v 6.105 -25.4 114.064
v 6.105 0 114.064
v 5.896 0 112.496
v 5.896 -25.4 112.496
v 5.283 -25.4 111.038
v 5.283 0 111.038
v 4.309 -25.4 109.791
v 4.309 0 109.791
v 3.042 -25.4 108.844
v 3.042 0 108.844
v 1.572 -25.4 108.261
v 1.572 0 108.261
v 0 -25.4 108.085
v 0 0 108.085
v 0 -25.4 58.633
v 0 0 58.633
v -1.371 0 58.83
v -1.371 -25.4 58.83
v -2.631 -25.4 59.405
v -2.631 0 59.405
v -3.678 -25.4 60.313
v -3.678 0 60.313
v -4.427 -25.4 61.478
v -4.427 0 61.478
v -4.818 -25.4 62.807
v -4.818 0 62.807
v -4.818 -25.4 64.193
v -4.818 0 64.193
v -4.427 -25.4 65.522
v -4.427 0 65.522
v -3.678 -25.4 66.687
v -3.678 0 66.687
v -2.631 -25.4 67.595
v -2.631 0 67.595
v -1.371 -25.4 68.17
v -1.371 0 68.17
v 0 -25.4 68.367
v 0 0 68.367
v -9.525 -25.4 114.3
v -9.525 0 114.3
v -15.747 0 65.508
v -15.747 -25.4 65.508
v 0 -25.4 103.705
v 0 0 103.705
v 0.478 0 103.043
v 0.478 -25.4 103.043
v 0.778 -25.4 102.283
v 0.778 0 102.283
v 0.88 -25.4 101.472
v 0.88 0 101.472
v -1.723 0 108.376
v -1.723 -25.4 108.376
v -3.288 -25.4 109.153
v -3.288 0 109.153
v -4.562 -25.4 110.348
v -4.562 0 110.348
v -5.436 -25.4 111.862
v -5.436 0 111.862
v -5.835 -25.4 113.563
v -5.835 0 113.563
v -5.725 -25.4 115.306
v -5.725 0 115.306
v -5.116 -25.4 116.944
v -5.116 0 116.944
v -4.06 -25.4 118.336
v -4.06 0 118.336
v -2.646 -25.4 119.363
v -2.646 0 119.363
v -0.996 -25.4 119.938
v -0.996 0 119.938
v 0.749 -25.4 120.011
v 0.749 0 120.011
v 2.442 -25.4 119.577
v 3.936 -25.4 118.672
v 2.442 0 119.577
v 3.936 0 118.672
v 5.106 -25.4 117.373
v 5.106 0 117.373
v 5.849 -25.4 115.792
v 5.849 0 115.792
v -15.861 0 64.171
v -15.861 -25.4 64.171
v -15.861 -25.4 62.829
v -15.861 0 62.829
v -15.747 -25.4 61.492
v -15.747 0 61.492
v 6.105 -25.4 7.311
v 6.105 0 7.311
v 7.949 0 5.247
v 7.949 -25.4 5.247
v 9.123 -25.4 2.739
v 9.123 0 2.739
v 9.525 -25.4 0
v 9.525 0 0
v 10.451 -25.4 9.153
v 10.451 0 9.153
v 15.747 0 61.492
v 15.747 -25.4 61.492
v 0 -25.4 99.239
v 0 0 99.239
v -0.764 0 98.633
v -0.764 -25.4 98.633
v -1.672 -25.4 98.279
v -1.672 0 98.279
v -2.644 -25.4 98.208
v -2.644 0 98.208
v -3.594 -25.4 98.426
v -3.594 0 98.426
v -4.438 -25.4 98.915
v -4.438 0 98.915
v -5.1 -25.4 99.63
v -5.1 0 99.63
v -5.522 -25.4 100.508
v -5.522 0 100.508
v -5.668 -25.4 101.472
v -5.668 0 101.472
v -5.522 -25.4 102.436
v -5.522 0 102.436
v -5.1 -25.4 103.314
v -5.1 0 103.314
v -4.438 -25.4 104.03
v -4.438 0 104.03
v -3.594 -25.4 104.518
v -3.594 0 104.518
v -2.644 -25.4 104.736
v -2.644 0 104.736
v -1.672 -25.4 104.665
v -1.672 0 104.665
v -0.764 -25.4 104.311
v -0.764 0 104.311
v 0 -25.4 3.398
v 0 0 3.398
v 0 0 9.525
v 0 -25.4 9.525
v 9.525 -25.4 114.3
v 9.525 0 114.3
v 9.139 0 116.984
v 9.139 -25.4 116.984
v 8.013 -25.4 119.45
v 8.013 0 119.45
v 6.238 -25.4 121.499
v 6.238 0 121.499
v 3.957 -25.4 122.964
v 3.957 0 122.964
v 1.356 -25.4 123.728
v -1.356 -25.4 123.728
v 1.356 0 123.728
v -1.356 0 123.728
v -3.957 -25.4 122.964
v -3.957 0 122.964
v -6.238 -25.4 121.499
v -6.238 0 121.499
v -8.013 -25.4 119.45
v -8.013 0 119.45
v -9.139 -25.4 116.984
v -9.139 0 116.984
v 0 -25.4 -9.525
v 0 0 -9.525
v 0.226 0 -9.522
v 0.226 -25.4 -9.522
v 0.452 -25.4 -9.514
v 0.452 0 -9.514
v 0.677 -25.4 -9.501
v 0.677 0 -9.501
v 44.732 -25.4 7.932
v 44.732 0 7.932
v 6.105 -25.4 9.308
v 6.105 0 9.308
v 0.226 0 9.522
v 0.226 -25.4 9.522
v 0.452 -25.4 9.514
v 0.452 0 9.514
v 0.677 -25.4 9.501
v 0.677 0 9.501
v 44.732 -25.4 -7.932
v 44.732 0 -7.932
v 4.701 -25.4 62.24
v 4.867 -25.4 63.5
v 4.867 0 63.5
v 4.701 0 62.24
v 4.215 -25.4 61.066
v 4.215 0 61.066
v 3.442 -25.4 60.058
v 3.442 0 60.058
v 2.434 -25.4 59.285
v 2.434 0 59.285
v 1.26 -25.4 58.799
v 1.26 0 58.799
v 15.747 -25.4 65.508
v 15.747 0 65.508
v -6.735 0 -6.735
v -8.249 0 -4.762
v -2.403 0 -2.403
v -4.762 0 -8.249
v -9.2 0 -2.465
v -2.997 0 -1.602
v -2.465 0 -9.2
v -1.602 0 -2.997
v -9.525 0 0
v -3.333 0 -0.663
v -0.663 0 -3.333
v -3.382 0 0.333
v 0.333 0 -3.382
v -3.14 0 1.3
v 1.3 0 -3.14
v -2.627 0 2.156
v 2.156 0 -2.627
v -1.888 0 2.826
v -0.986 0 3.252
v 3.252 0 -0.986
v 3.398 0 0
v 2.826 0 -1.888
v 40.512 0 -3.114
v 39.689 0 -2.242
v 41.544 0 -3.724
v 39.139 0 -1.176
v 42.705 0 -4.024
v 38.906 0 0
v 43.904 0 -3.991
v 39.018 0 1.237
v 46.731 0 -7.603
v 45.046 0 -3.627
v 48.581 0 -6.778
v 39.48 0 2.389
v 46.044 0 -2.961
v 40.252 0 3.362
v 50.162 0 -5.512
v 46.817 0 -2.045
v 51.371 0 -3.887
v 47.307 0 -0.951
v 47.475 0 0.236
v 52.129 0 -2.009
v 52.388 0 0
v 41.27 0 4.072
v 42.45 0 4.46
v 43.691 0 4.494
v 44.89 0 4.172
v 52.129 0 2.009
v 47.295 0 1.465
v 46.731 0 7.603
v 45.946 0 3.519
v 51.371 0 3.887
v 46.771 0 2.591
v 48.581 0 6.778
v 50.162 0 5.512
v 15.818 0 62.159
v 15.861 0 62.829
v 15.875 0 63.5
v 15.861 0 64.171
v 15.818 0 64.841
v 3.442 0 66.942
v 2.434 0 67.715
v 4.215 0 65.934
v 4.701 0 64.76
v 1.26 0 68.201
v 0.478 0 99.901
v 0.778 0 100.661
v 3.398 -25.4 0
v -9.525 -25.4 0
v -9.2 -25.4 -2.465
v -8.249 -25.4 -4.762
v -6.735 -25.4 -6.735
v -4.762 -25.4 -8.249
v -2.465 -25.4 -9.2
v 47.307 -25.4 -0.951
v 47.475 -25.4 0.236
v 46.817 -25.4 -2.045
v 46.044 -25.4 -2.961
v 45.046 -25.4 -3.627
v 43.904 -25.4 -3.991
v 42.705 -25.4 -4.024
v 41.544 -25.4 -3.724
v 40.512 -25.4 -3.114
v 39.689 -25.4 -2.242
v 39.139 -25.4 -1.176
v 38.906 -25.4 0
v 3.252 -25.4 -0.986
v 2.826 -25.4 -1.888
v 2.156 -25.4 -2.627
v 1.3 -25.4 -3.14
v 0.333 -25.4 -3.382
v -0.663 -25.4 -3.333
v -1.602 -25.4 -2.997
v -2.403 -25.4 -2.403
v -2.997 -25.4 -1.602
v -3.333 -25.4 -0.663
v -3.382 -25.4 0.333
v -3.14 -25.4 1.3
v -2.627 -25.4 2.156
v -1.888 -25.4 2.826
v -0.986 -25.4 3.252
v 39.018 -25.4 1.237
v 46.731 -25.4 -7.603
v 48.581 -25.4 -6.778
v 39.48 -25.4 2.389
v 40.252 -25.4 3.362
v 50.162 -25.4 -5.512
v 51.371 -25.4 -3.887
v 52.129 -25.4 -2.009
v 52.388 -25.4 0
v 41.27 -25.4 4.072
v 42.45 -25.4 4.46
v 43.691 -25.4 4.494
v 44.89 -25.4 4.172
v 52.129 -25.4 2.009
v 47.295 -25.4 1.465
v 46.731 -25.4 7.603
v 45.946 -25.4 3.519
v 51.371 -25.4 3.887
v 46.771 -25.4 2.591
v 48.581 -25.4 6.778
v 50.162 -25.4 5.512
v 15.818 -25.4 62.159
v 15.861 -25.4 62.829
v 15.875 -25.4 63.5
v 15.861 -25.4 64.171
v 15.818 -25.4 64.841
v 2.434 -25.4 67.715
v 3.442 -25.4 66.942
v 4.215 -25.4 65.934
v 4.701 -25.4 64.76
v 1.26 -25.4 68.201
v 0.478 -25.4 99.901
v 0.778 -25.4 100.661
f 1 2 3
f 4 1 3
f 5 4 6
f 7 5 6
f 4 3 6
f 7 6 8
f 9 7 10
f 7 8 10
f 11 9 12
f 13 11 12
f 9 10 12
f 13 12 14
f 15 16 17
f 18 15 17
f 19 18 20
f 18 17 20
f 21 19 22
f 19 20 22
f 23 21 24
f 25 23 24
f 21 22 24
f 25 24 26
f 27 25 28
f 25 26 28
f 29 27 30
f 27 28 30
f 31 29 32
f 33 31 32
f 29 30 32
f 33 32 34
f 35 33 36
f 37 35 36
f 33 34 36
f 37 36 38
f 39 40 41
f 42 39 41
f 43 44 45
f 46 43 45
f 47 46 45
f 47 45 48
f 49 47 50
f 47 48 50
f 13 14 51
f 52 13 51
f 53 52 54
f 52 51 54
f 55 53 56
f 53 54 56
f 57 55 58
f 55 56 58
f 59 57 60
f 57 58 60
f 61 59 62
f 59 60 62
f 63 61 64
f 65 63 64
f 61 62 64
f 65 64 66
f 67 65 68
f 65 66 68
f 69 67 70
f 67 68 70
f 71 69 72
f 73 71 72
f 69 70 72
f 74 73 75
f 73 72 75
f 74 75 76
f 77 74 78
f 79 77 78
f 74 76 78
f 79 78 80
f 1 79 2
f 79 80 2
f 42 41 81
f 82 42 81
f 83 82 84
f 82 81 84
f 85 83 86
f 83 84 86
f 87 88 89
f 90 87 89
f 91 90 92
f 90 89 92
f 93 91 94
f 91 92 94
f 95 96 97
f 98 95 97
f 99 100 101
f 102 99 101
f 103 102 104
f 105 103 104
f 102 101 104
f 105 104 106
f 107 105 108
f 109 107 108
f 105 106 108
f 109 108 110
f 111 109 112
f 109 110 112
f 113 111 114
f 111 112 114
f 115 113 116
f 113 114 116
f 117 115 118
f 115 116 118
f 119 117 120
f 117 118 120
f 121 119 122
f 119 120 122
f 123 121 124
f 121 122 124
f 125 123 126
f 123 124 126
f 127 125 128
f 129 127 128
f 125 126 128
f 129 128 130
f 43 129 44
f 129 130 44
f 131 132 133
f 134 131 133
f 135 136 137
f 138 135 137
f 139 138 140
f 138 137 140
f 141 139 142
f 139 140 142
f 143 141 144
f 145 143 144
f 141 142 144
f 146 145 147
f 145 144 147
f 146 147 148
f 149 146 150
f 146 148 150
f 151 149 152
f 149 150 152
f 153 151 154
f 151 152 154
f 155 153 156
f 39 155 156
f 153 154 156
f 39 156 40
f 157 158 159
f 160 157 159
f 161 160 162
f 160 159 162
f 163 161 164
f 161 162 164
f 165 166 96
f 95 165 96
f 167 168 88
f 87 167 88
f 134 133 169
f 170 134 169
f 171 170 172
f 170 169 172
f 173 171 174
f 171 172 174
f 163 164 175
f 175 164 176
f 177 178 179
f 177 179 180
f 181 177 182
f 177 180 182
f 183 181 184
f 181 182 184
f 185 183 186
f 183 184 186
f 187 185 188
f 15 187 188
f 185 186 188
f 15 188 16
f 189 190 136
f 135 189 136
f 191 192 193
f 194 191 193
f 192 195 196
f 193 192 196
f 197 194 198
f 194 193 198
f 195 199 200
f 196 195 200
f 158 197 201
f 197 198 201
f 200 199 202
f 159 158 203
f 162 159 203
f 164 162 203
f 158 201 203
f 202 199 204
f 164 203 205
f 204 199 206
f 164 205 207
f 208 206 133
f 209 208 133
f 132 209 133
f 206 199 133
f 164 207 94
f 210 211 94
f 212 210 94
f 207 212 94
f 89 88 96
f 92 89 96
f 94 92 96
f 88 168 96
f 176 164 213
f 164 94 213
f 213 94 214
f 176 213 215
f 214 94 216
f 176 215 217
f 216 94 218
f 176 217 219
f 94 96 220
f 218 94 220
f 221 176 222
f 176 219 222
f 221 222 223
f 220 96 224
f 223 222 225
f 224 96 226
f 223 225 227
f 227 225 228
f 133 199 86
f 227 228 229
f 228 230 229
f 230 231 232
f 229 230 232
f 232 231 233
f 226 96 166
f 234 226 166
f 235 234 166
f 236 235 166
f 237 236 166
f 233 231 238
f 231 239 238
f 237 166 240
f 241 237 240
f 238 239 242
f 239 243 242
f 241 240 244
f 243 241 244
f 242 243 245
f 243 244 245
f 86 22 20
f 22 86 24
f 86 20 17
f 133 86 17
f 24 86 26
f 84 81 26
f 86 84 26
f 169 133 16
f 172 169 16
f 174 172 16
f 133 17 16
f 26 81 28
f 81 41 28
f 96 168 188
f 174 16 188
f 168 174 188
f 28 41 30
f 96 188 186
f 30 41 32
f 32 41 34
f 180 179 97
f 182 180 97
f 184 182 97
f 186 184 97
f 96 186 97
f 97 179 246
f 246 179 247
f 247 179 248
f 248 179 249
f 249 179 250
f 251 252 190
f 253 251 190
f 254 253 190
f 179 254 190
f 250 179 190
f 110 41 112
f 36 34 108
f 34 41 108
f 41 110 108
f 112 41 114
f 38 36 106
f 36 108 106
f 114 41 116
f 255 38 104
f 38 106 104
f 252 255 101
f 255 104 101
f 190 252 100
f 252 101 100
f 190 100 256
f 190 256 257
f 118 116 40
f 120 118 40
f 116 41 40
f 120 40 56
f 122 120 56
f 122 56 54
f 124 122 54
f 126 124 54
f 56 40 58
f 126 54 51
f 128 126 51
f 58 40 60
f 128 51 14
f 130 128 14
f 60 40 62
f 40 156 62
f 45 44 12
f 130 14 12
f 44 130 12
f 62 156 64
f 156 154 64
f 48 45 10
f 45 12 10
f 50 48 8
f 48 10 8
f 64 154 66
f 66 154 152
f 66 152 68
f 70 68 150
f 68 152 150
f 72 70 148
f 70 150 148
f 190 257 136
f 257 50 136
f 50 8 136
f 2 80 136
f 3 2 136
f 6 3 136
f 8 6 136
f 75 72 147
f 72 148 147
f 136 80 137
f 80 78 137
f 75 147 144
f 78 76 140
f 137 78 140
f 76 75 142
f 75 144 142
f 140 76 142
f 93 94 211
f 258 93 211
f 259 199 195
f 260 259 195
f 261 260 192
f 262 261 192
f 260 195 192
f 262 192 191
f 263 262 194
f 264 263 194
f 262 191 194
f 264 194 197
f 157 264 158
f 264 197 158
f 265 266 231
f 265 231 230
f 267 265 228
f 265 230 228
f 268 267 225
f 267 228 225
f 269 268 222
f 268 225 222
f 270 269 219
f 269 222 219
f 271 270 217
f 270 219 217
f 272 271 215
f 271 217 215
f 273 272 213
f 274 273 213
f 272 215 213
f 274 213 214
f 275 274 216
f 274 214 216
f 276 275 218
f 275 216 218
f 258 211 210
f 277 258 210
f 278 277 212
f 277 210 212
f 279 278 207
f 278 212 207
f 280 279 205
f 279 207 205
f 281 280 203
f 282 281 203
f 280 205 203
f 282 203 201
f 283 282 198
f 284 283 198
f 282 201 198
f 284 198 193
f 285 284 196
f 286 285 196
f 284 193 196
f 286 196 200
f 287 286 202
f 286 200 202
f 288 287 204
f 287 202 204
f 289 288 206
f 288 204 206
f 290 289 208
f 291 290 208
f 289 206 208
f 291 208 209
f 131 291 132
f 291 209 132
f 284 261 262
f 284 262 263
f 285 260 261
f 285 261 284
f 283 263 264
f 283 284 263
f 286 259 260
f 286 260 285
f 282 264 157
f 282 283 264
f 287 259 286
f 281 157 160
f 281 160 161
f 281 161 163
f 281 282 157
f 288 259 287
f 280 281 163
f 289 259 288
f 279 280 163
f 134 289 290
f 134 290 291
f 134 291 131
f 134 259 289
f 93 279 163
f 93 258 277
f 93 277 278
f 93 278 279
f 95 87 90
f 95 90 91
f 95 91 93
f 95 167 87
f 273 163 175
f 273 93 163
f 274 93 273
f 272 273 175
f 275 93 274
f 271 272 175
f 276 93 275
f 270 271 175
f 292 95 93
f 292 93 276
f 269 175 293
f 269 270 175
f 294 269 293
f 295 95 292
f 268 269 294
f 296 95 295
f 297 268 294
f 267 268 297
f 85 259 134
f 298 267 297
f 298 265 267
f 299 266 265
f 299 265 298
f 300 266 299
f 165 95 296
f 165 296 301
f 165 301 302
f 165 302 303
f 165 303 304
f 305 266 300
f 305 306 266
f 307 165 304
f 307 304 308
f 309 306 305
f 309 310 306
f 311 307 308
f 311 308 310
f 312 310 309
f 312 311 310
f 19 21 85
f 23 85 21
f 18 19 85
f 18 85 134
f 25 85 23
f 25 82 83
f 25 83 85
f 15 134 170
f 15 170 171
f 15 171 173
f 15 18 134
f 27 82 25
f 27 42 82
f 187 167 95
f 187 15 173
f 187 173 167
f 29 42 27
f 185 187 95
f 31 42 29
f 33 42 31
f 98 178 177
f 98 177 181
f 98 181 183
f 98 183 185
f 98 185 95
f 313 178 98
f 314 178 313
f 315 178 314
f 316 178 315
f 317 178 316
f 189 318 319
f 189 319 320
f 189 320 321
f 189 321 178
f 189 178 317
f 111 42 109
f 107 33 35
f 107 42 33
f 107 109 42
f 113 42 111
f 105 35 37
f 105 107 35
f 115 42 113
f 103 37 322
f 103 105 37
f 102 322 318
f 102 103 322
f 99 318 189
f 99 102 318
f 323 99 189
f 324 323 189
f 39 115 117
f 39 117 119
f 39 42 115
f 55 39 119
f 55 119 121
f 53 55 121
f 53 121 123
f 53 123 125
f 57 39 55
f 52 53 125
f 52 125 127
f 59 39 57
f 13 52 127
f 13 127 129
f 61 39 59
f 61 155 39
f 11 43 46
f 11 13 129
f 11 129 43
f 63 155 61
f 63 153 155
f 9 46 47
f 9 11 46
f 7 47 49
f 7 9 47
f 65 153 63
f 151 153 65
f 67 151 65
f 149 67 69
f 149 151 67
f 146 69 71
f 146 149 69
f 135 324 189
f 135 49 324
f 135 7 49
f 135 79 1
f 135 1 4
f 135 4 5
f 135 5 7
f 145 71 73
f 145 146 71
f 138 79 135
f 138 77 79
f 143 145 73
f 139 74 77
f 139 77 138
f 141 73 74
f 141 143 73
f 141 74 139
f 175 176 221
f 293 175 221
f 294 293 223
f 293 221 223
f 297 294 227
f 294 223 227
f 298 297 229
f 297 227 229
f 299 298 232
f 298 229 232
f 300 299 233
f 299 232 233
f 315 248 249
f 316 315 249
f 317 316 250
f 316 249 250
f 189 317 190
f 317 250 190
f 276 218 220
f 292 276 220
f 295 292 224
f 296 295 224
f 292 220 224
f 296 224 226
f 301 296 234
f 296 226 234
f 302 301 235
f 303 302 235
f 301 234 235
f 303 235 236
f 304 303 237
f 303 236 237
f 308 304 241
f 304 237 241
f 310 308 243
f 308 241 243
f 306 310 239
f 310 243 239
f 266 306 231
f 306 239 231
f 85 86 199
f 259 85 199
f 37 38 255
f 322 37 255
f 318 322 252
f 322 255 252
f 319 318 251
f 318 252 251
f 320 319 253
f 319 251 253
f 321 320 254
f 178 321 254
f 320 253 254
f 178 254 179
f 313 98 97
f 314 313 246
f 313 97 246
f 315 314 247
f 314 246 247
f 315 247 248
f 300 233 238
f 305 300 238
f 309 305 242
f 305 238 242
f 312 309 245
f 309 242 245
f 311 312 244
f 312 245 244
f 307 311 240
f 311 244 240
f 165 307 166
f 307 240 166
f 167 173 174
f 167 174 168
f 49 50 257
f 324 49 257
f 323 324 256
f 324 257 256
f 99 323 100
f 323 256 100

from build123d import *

# Parameters (mm, degrees)
F1_DEPTH = 25.4


with BuildPart() as f1:
    # F0 (on Front) → F1 (new body)
    with BuildSketch(Plane.XZ):
        with BuildLine():
            ThreePointArc((-9.525, 114.3), (-6.7351920908, 107.5648079092), (0, 104.775))
            ThreePointArc((0, 104.775), (6.7351920908, 107.5648079092), (9.525, 114.3))
            ThreePointArc((9.525, 114.3), (0, 123.825), (-9.525, 114.3))
        make_face()
        with BuildLine():
            ThreePointArc((6.104734078, 114.063590765), (4.3089160173, 109.7911312939), (0, 108.084639221))
            ThreePointArc((0, 108.084639221), (-4.0599425849, 118.3360502361), (6.104734078, 114.063590765))
        make_face(mode=Mode.SUBTRACT)
        with BuildLine():
            ThreePointArc((9.525, 114.3), (6.7351920908, 107.5648079092), (0, 104.775))
            Line((0, 104.775), (0, 103.7053296111))
            ThreePointArc((0, 103.7053296111), (0.6520493641, 102.6722677878), (0.8799784566, 101.4720872045))
            ThreePointArc((0.8799784566, 101.4720872045), (0.6520493641, 100.2719066211), (0, 99.2388447978))
            Line((0, 99.2388447978), (0, 79.375))
            ThreePointArc((0, 79.375), (10.4912828548, 75.4142187767), (15.7474569047, 65.5082893304))
            Line((15.7474569047, 65.5082893304), (9.525, 114.3))
        make_face()
        with BuildLine():
            Line((0, 103.7053296111), (0, 104.775))
            ThreePointArc((0, 104.775), (-6.7351920908, 107.5648079092), (-9.525, 114.3))
            Line((-9.525, 114.3), (-15.7474569047, 65.5082893304))
            ThreePointArc((-15.7474569047, 65.5082893304), (-10.4912828548, 75.4142187767), (0, 79.375))
            Line((0, 79.375), (0, 99.2388447978))
            ThreePointArc((0, 99.2388447978), (-5.6676065299, 101.4720872045), (0, 103.7053296111))
        make_face()
        with BuildLine():
            ThreePointArc((0, 79.375), (-10.4912828548, 75.4142187767), (-15.7474569047, 65.5082893304))
            ThreePointArc((-15.7474569047, 65.5082893304), (-15.875, 63.5), (-15.7474569047, 61.4917106696))
            ThreePointArc((-15.7474569047, 61.4917106696), (-10.4912828548, 51.5857812233), (0, 47.625))
            Line((0, 47.625), (0, 58.6328048089))
            ThreePointArc((0, 58.6328048089), (-4.8671951911, 63.5), (0, 68.3671951911))
            Line((0, 68.3671951911), (0, 79.375))
        make_face()
        with BuildLine():
            ThreePointArc((15.875, 63.5), (15.8430821396, 64.5061676396), (15.7474569047, 65.5082893304))
            ThreePointArc((15.7474569047, 65.5082893304), (10.4912828548, 75.4142187767), (0, 79.375))
            Line((0, 79.375), (0, 68.3671951911))
            ThreePointArc((0, 68.3671951911), (3.441626725, 66.941626725), (4.8671951911, 63.5))
            ThreePointArc((4.8671951911, 63.5), (3.441626725, 60.058373275), (0, 58.6328048089))
            Line((0, 58.6328048089), (0, 47.625))
            ThreePointArc((0, 47.625), (10.4912828548, 51.5857812233), (15.7474569047, 61.4917106696))
            ThreePointArc((15.7474569047, 61.4917106696), (15.8430821396, 62.4938323604), (15.875, 63.5))
        make_face()
        with BuildLine():
            ThreePointArc((0, 47.625), (-10.4912828548, 51.5857812233), (-15.7474569047, 61.4917106696))
            Line((-15.7474569047, 61.4917106696), (-9.525, 0))
            ThreePointArc((-9.525, 0), (-6.7351920908, 6.7351920908), (0, 9.525))
            Line((0, 9.525), (0, 47.625))
        make_face()
        with BuildLine():
            ThreePointArc((15.7474569047, 61.4917106696), (10.4912828548, 51.5857812233), (0, 47.625))
            Line((0, 47.625), (0, 9.525))
            ThreePointArc((0, 9.525), (0.3388863295, 9.5189695375), (0.6773435479, 9.500885786))
            Line((0.6773435479, 9.500885786), (6.104734078, 9.3076644033))
            Line((6.104734078, 9.3076644033), (10.451200974, 9.1529251528))
            Line((10.451200974, 9.1529251528), (15.7474569047, 61.4917106696))
        make_face()
        with BuildLine():
            ThreePointArc((0, 9.525), (-6.7351920908, 6.7351920908), (-9.525, 0))
            ThreePointArc((-9.525, 0), (-6.7351920908, -6.7351920908), (0, -9.525))
            Line((0, -9.525), (0.6773435479, -9.500885786))
            ThreePointArc((0.6773435479, -9.500885786), (6.9705567315, -6.4912990883), (9.525, 0))
            Line((9.525, 0), (3.3982770983, 0))
            ThreePointArc((3.3982770983, 0), (-2.4029447806, -2.4029447806), (0, 3.3982770983))
            Line((0, 3.3982770983), (0, 9.525))
        make_face()
        with BuildLine():
            Line((0.6773435479, -9.500885786), (0, -9.525))
            ThreePointArc((0, -9.525), (0.3388863295, -9.5189695375), (0.6773435479, -9.500885786))
        make_face()
        with BuildLine():
            Line((9.525, 0), (10.451200974, 9.1529251528))
            Line((10.451200974, 9.1529251528), (6.104734078, 9.3076644033))
            Line((6.104734078, 9.3076644033), (6.104734078, 7.3114873204))
            ThreePointArc((6.104734078, 7.3114873204), (8.627665301, 4.0359653682), (9.525, 0))
        make_face()
        with BuildLine():
            Line((44.7324052746, 7.9324746146), (10.451200974, 9.1529251528))
            Line((10.451200974, 9.1529251528), (9.525, 0))
            Line((9.525, 0), (36.5125, 0))
            ThreePointArc((36.5125, 0), (38.9380895153, 5.7116327839), (44.7324052746, 7.9324746146))
        make_face()
        with BuildLine():
            ThreePointArc((9.525, 0), (6.9705567315, -6.4912990883), (0.6773435479, -9.500885786))
            Line((0.6773435479, -9.500885786), (44.7324052746, -7.9324746146))
            ThreePointArc((44.7324052746, -7.9324746146), (38.9380895153, -5.7116327839), (36.5125, 0))
            Line((36.5125, 0), (9.525, 0))
        make_face()
        with BuildLine():
            ThreePointArc((52.3875, 0), (50.1616327839, 5.5119104847), (44.7324052746, 7.9324746146))
            ThreePointArc((44.7324052746, 7.9324746146), (38.9380895153, 5.7116327839), (36.5125, 0))
            ThreePointArc((36.5125, 0), (38.9380895153, -5.7116327839), (44.7324052746, -7.9324746146))
            ThreePointArc((44.7324052746, -7.9324746146), (50.1616327839, -5.5119104847), (52.3875, 0))
        make_face()
        with BuildLine():
            ThreePointArc((47.4750581285, 0.236410473), (43.305671032, -4.0495958985), (38.9063060284, 0))
            ThreePointArc((38.9063060284, 0), (43.0691705984, 4.5224168445), (47.4750581285, 0.236410473))
        make_face(mode=Mode.SUBTRACT)
    extrude(amount=F1_DEPTH)


solid = f1.part
